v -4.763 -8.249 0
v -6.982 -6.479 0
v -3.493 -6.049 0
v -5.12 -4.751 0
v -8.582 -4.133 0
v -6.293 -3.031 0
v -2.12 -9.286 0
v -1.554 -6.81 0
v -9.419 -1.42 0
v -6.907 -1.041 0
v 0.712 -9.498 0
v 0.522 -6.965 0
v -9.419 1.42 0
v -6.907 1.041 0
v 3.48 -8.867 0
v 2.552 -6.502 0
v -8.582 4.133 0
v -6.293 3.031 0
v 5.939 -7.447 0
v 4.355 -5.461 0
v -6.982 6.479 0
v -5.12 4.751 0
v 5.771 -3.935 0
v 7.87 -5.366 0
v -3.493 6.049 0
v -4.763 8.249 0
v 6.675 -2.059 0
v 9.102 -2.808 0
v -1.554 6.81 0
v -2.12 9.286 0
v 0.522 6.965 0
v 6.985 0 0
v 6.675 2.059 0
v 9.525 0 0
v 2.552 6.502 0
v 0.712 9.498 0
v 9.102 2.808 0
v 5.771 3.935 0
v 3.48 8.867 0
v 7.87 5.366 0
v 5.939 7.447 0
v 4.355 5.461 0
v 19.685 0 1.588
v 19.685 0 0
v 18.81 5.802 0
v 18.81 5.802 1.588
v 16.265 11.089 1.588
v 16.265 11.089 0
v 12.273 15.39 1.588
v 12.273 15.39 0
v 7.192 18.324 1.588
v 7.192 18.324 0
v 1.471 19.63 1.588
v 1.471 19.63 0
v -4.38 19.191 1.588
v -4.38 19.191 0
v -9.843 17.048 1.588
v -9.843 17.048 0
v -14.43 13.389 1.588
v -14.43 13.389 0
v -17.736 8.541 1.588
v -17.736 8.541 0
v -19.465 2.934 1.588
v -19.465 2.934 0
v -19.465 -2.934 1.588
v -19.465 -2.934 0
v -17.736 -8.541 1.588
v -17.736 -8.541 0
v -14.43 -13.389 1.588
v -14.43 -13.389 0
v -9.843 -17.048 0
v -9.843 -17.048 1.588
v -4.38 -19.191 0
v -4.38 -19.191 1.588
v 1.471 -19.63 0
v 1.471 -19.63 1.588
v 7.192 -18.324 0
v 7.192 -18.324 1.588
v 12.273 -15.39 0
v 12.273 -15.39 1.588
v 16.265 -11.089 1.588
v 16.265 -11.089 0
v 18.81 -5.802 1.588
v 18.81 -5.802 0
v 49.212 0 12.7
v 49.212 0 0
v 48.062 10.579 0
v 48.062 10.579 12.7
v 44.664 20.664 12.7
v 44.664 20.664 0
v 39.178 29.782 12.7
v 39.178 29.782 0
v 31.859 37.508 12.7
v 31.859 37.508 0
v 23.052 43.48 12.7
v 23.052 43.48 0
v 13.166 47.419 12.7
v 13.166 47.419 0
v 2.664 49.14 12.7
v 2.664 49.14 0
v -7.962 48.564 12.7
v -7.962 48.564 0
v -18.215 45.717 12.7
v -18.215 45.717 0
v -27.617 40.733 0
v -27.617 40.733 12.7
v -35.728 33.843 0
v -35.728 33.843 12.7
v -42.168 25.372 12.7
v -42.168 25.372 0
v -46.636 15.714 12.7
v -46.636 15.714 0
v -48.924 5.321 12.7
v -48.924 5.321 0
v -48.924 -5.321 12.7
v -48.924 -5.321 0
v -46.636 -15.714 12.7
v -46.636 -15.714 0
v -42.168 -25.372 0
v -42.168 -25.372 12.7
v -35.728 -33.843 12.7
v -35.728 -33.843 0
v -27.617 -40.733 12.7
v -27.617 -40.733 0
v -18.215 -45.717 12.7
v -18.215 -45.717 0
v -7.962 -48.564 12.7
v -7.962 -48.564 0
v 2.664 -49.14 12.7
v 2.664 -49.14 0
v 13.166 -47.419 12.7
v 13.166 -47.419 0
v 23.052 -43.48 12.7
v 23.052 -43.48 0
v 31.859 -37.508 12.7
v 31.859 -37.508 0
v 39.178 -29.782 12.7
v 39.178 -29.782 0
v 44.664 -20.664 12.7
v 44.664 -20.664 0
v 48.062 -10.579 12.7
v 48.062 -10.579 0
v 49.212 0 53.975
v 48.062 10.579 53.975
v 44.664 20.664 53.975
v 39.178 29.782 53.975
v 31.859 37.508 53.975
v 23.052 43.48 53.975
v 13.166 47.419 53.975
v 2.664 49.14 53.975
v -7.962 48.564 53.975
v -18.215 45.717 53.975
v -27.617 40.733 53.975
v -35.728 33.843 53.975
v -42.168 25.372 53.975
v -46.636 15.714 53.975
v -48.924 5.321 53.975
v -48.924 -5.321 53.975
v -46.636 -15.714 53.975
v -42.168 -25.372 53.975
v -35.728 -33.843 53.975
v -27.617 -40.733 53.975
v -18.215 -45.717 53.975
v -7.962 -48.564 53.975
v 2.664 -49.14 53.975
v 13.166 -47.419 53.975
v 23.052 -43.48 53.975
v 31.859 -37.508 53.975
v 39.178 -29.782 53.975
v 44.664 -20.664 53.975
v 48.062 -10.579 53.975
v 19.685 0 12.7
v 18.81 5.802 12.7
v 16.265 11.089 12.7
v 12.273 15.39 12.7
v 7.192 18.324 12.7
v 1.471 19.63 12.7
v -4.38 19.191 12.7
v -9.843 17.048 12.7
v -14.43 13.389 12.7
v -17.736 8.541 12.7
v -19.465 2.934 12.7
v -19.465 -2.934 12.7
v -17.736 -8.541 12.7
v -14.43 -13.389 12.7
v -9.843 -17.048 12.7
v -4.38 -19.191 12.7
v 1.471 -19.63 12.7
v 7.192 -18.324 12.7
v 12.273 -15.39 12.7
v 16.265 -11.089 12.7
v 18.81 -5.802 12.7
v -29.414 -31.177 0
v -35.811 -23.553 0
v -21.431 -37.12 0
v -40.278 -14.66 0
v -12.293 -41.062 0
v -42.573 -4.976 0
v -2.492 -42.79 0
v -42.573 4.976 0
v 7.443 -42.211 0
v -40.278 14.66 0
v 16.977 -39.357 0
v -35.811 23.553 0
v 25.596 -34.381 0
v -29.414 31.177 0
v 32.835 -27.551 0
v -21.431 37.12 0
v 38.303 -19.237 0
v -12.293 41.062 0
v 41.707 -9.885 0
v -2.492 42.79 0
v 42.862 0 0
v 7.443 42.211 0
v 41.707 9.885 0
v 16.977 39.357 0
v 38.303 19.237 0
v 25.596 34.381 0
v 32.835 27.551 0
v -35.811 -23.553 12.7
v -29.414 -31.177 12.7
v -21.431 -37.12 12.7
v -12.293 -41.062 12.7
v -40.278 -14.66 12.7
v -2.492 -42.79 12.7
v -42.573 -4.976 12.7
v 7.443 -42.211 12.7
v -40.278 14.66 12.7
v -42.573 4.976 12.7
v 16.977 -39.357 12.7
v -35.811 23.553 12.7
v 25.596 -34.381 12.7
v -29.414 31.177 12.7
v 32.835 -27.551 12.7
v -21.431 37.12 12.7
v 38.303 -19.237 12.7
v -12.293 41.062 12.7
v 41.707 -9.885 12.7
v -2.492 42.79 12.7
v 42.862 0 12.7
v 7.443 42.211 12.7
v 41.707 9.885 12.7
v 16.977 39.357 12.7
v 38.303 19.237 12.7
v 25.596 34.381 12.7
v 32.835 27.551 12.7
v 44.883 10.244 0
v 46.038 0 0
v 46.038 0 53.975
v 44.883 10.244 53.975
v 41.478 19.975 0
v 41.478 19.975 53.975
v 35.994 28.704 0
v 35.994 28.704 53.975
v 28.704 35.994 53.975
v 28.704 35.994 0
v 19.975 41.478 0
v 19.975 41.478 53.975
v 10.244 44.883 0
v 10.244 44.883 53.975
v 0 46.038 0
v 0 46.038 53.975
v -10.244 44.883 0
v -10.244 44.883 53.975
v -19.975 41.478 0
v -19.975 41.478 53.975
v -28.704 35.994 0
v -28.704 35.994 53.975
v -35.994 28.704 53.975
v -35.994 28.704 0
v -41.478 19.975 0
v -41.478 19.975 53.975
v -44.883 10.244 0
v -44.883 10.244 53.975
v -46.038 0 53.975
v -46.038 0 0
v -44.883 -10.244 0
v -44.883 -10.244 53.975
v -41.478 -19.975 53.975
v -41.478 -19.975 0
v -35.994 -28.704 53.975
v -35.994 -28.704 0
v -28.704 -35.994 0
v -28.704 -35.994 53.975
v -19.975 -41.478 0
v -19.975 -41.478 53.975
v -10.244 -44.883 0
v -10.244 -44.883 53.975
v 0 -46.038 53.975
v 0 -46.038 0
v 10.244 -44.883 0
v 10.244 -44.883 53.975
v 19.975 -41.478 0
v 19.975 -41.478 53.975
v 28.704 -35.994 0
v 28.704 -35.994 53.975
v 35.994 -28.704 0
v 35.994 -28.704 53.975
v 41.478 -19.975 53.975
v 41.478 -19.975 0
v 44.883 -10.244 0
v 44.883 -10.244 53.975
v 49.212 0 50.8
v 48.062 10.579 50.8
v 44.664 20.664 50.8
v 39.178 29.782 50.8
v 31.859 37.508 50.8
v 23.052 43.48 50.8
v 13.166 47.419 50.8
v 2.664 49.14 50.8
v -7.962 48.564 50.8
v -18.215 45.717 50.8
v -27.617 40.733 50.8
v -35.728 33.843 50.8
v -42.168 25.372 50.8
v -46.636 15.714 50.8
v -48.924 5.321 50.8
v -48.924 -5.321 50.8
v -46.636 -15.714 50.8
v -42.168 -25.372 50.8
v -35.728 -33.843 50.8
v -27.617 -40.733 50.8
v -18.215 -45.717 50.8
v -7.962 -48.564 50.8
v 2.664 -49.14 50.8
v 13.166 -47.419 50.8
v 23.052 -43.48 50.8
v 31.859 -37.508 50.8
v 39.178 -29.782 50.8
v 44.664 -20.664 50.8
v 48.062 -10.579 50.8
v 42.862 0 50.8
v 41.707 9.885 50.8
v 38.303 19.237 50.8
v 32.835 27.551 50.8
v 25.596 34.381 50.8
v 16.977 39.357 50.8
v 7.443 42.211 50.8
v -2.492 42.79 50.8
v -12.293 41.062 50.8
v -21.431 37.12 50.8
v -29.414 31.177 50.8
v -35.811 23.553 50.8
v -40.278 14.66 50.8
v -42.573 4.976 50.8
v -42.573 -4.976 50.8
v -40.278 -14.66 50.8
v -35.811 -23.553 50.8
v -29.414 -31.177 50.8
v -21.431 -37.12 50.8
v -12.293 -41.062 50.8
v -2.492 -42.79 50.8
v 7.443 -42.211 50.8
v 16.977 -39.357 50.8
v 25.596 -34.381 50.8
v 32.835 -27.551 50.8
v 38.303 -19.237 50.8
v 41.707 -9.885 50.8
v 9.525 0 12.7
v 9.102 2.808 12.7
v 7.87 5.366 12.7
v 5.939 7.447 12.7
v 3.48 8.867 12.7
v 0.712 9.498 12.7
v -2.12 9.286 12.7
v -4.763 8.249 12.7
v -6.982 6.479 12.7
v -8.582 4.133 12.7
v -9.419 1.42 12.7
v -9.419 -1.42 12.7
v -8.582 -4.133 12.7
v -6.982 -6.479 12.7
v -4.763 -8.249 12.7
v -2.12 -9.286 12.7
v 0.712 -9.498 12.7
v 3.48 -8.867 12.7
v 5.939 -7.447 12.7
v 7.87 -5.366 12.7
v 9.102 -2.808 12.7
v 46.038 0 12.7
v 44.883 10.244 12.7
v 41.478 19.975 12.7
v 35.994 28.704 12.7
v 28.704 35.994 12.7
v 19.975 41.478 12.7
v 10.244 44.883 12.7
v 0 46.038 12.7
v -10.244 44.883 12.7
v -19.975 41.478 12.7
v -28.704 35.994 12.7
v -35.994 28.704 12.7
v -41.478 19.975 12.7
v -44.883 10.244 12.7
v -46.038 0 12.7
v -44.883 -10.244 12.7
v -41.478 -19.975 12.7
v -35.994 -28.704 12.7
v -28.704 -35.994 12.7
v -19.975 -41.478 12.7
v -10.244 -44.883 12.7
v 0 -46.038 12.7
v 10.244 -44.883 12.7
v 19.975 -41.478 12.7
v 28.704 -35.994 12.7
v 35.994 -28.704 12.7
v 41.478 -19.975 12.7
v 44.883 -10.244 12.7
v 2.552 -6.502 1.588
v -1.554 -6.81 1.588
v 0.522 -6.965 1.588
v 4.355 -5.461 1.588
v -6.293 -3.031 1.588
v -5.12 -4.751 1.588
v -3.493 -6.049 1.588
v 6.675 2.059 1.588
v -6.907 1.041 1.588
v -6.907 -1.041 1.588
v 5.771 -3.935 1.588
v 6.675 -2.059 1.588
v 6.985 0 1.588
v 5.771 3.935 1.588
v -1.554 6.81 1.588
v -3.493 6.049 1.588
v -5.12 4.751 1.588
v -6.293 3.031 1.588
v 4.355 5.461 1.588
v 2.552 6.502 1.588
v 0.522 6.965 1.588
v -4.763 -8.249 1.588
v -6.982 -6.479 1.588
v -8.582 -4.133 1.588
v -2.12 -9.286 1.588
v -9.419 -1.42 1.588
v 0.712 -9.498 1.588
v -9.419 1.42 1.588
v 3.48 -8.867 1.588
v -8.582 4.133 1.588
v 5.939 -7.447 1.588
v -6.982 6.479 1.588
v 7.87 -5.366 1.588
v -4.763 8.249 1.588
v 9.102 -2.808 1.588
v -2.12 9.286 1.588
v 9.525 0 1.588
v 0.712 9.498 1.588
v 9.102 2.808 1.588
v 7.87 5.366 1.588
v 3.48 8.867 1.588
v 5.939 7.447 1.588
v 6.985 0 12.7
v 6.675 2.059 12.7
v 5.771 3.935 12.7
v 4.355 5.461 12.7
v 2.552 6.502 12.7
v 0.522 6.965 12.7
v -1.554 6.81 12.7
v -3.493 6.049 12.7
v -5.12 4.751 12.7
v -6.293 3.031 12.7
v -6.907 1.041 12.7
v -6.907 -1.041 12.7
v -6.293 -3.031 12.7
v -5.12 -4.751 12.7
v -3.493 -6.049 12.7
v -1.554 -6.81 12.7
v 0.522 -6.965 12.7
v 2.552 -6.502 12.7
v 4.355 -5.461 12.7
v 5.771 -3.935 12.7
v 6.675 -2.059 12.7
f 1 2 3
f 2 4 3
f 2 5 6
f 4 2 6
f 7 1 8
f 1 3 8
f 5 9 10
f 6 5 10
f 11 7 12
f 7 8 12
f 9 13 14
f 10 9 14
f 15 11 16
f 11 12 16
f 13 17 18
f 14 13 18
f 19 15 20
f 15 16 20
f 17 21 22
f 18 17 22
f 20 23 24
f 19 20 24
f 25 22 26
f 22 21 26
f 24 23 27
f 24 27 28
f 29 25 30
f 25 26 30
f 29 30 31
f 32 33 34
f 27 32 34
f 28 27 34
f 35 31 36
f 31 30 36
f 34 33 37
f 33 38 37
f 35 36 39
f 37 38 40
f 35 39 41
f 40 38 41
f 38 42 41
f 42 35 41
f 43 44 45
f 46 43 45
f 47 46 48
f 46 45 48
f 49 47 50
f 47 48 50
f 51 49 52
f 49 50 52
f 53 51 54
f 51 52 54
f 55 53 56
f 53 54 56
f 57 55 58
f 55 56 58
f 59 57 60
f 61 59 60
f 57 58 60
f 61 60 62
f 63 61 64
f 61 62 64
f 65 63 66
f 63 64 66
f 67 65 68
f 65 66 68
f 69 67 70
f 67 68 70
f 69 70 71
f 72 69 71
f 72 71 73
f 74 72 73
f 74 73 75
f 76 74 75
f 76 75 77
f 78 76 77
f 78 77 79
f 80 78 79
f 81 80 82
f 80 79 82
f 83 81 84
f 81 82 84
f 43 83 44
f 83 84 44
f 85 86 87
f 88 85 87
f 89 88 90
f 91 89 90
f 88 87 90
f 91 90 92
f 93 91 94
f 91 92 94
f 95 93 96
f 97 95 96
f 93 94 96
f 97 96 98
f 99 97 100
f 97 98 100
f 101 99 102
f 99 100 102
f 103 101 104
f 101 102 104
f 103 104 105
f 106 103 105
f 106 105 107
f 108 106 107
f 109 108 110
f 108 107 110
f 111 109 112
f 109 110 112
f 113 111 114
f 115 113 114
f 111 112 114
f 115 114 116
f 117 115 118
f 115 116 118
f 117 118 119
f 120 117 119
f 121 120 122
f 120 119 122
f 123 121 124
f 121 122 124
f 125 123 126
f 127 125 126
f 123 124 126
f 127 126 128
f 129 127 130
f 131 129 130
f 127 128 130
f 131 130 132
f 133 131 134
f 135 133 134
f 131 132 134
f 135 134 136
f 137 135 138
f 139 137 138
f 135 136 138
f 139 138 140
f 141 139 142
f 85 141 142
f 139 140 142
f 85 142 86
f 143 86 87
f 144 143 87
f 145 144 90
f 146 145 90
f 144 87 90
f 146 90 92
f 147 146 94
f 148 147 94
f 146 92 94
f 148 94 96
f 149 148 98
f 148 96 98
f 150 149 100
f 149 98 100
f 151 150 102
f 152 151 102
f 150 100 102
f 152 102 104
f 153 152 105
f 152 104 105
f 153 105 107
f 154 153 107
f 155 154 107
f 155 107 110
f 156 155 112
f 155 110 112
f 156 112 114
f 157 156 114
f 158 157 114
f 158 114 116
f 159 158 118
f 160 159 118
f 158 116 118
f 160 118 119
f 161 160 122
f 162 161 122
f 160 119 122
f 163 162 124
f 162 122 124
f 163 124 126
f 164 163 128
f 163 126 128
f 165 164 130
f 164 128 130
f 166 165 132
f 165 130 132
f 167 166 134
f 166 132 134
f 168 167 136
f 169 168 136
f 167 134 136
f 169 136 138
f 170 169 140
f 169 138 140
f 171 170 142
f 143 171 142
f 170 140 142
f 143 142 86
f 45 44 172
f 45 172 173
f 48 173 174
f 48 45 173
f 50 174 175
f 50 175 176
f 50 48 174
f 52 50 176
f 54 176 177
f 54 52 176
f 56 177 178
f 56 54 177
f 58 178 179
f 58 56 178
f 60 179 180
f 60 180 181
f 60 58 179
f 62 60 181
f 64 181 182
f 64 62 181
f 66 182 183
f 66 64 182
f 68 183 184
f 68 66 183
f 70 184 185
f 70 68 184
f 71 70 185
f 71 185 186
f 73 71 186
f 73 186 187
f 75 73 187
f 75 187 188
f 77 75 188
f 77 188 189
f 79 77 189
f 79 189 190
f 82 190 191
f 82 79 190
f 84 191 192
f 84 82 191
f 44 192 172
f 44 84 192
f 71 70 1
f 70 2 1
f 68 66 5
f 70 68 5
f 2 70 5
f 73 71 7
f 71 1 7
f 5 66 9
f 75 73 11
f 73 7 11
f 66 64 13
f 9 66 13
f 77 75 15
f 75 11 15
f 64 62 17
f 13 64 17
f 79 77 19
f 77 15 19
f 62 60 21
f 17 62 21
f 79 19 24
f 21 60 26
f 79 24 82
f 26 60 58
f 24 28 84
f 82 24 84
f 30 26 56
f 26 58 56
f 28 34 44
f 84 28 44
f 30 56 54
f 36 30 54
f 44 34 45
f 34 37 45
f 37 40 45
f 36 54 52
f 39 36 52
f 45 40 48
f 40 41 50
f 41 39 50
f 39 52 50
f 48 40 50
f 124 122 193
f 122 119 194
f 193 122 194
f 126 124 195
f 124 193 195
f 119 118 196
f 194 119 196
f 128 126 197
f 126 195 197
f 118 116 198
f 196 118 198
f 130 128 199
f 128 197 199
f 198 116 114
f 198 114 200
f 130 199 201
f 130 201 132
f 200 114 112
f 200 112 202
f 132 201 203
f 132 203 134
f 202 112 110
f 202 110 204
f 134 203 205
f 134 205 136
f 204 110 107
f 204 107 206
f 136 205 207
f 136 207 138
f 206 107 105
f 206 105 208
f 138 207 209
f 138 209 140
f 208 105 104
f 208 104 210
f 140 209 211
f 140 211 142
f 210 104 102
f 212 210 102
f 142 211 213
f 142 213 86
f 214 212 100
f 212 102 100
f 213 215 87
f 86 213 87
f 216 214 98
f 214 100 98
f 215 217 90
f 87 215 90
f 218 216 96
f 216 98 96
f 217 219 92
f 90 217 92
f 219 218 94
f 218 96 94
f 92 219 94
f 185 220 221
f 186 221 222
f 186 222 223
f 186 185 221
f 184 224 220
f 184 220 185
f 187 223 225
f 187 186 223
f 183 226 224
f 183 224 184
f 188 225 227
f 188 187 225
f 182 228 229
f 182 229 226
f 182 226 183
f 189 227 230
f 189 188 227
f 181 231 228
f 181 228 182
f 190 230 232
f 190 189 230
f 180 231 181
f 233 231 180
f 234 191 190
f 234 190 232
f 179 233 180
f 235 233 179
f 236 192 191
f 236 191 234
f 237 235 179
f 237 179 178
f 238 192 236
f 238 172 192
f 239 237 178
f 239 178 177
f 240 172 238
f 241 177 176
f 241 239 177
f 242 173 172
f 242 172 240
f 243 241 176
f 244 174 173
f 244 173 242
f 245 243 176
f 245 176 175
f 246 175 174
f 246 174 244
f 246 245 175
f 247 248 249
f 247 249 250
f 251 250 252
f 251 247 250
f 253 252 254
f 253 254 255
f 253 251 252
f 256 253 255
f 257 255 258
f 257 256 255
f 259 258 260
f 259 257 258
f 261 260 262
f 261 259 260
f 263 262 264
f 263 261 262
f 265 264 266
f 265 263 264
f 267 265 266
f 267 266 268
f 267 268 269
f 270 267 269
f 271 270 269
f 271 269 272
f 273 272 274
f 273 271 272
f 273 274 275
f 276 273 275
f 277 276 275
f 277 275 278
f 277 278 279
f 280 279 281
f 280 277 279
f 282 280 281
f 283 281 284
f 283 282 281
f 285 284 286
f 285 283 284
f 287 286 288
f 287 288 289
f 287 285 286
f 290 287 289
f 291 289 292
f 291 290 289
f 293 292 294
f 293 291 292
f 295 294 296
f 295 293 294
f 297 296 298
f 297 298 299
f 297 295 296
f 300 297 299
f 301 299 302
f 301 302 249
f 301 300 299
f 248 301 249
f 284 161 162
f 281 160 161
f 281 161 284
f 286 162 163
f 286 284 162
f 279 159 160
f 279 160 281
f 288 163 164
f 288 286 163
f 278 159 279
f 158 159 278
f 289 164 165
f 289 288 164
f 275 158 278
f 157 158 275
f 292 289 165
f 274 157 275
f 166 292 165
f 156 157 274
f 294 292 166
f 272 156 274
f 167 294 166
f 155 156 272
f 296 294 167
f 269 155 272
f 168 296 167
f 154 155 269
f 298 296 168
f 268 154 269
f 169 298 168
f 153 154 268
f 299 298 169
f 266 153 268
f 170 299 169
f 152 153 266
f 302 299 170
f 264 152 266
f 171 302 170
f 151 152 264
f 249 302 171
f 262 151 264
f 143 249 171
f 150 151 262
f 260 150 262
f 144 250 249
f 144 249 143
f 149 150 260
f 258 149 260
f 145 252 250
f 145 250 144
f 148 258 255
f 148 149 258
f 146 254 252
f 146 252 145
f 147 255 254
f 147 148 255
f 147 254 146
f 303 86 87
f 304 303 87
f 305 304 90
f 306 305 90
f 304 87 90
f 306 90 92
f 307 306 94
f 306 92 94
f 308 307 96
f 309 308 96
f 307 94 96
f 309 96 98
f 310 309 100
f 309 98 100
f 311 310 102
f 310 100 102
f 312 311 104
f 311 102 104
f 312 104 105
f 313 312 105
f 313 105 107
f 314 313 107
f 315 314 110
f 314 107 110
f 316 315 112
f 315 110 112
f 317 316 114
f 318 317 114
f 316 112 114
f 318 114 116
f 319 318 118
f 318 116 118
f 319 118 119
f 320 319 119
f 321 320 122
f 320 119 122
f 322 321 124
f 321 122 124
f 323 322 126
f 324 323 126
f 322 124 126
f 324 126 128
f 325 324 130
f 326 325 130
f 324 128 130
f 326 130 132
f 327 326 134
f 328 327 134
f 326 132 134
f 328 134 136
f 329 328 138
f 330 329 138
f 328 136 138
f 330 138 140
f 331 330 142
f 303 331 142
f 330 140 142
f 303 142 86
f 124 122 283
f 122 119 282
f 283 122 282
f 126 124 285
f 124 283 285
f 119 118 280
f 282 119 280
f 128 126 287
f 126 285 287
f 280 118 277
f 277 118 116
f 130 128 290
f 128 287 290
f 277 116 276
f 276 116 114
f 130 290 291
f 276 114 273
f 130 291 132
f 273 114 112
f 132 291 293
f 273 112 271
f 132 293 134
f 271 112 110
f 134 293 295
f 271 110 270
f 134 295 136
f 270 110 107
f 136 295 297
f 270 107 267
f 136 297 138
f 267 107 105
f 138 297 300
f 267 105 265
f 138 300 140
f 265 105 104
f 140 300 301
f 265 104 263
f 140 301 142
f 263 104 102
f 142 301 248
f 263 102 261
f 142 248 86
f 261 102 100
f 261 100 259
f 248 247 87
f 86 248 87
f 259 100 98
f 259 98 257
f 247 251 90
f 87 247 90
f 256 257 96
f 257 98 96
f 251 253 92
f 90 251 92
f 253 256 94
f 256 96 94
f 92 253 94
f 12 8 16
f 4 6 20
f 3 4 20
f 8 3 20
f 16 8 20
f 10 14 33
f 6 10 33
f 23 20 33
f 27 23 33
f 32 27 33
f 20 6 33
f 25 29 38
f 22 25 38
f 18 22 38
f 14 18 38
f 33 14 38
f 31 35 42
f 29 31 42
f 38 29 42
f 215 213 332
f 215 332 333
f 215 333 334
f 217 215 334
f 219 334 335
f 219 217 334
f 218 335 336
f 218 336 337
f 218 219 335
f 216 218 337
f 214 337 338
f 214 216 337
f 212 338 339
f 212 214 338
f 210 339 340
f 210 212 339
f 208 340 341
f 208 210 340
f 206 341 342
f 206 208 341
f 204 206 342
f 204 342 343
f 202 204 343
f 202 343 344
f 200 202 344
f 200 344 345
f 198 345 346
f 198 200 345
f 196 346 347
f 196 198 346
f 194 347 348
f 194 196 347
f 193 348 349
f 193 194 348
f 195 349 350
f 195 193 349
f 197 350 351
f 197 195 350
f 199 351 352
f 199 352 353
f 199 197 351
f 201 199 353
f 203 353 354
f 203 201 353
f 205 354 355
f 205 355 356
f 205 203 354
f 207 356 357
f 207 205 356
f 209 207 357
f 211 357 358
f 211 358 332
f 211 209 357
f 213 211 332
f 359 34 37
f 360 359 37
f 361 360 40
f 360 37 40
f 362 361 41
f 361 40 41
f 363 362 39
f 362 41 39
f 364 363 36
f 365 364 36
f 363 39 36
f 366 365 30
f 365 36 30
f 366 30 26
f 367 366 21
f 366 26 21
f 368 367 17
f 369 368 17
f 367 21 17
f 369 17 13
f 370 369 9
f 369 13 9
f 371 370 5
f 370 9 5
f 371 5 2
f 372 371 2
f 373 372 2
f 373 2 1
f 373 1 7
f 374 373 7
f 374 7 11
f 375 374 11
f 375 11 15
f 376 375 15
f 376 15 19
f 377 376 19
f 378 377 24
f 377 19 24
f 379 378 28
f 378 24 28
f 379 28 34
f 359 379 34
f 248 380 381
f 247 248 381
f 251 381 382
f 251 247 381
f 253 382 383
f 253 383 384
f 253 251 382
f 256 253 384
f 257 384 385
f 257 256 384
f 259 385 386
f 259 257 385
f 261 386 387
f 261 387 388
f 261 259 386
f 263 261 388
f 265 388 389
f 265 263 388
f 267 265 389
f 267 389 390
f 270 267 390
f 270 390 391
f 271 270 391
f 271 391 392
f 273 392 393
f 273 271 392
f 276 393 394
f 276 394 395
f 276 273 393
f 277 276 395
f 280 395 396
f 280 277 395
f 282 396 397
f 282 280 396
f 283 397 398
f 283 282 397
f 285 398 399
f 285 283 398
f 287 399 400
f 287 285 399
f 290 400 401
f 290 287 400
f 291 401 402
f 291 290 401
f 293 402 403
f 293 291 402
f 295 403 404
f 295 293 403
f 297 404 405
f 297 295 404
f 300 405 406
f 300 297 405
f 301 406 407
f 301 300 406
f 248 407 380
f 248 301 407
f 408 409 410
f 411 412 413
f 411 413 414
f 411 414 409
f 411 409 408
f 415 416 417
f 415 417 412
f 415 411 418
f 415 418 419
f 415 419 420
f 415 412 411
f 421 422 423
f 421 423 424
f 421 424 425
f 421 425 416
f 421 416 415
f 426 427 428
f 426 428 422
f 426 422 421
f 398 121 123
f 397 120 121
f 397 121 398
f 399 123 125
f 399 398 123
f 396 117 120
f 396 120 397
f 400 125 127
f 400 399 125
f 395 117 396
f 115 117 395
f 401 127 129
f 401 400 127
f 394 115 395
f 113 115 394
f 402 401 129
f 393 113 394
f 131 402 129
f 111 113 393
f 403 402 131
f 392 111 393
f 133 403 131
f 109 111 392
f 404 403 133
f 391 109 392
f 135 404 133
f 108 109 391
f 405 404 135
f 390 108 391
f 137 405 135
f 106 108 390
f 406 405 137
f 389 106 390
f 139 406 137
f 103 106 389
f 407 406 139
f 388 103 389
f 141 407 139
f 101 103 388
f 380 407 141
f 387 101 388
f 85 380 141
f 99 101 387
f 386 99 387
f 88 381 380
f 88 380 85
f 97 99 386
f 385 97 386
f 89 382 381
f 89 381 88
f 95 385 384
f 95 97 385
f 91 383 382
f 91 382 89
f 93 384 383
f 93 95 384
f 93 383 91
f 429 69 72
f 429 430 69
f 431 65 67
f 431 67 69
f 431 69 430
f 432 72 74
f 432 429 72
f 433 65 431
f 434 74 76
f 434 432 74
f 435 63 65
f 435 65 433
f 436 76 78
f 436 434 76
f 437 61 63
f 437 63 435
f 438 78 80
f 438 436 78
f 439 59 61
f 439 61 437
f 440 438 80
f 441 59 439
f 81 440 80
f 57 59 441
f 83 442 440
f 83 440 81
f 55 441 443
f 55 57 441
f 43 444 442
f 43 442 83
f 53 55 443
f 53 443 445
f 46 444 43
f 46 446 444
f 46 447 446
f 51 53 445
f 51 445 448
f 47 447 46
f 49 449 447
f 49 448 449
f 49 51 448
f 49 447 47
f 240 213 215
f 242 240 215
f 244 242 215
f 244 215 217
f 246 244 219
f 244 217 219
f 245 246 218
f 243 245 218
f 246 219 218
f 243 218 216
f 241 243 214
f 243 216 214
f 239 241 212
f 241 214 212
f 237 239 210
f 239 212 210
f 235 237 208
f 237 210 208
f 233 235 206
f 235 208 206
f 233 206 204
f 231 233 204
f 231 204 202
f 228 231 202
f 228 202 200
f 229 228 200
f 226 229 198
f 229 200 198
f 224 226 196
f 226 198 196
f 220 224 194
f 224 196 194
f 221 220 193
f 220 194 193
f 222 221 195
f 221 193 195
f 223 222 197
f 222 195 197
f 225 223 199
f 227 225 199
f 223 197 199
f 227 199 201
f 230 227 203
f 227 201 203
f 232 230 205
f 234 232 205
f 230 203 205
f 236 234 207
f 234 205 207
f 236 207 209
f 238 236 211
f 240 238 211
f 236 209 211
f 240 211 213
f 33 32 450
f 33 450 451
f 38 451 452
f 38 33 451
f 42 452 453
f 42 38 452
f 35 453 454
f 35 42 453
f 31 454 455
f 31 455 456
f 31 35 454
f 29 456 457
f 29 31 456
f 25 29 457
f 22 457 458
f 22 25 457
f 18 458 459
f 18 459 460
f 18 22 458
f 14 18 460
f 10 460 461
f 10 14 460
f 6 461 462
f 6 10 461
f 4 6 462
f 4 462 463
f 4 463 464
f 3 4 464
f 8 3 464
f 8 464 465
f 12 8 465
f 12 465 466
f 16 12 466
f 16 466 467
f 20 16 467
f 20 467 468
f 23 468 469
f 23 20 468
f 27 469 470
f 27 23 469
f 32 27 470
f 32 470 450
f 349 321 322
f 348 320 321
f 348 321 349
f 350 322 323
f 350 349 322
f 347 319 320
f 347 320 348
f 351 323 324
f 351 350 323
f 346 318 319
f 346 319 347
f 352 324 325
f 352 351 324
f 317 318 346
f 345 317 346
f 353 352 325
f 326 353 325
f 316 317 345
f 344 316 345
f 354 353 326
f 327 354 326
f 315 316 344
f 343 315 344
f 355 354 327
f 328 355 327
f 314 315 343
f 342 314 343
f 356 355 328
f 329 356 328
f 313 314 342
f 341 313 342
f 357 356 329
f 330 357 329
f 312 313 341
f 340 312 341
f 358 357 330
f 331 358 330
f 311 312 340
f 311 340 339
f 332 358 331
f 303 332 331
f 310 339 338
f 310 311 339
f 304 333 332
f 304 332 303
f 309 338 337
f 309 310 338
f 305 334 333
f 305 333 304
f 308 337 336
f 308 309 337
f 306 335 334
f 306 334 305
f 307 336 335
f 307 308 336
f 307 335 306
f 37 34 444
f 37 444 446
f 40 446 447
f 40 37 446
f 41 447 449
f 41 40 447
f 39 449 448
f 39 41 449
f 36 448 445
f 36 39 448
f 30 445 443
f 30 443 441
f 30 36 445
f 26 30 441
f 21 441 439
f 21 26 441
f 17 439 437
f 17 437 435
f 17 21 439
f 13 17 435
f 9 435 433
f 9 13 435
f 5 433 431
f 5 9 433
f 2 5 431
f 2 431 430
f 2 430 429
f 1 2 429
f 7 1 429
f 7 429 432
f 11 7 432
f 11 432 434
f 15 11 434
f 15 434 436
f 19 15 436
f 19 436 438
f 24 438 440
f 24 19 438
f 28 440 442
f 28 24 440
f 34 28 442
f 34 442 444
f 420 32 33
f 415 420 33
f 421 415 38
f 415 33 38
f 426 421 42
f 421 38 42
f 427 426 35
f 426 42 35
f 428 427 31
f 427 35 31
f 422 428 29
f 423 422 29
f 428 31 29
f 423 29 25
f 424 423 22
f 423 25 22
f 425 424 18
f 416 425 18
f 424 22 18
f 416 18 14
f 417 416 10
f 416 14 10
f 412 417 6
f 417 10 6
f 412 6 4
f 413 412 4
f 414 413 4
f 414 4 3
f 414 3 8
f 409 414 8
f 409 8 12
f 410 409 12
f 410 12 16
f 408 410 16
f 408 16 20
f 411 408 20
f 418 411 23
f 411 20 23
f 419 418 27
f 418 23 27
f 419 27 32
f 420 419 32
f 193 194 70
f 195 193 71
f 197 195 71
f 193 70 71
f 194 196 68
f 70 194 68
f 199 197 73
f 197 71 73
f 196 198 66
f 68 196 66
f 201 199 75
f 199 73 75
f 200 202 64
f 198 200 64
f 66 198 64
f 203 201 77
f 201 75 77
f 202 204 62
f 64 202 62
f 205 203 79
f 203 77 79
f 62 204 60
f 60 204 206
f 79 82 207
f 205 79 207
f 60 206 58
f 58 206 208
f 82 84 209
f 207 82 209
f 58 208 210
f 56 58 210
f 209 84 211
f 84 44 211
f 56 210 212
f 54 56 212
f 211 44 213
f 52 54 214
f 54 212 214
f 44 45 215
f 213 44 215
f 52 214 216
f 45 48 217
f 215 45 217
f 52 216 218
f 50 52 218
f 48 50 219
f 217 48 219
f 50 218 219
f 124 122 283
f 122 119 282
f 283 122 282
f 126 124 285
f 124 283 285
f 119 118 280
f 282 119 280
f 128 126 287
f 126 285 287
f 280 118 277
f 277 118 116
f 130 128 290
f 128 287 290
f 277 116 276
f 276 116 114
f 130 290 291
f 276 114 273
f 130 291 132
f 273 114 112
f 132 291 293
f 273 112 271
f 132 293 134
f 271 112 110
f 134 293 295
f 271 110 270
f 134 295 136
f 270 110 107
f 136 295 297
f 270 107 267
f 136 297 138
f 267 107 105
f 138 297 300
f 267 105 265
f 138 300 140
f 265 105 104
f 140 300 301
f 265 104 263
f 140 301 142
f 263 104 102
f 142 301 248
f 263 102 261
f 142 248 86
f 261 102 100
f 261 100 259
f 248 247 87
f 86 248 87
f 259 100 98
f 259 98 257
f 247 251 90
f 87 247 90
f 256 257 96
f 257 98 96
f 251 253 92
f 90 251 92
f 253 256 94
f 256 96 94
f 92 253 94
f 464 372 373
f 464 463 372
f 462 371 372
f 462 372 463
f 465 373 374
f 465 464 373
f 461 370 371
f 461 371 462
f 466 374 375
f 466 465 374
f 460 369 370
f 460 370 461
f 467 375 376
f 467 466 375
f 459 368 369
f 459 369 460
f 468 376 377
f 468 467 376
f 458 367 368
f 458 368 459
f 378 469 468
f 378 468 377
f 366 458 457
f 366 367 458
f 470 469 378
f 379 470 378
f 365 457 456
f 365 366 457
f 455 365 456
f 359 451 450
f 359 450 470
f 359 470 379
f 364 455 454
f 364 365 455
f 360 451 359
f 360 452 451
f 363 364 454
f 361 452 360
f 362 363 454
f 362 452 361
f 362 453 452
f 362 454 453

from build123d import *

# Parameters (mm, degrees)
F0_R     = 49.2125
F0_R_2   = 46.0375
F1_DEPTH = 53.975
F0_R_3   = 42.8625
F2_DEPTH = 50.8
F0_R_4   = 19.685
F0_R_5   = 9.525
F0_R_6   = 6.985
F3_DEPTH = 12.7
F4_DEPTH = 1.5875


with BuildPart() as f1:
    # F0 (on Top) → F1 (new body)
    with BuildSketch(Plane.XY):
        Circle(F0_R)
        Circle(F0_R_2, mode=Mode.SUBTRACT)
    extrude(amount=F1_DEPTH)


with BuildPart() as f2:
    # F0 (on Top) → F2 (new body)
    with BuildSketch(Plane.XY):
        Circle(F0_R)
        Circle(F0_R_2, mode=Mode.SUBTRACT)
        Circle(F0_R_2)
        Circle(F0_R_3, mode=Mode.SUBTRACT)
    extrude(amount=F2_DEPTH)


with BuildPart() as f3:
    # F0 (on Top) → F3 (new body)
    with BuildSketch(Plane.XY):
        Circle(F0_R)
        Circle(F0_R_2, mode=Mode.SUBTRACT)
        Circle(F0_R_3)
        Circle(F0_R_4, mode=Mode.SUBTRACT)
        Circle(F0_R_5)
        Circle(F0_R_6, mode=Mode.SUBTRACT)
    extrude(amount=F3_DEPTH)


with BuildPart() as f4:
    # F0 (on Top) → F4 (new body)
    with BuildSketch(Plane.XY):
        Circle(F0_R_4)
        Circle(F0_R_5, mode=Mode.SUBTRACT)
        Circle(F0_R_6)
    extrude(amount=F4_DEPTH)


solid = Compound([f1.part, f2.part, f3.part, f4.part])
